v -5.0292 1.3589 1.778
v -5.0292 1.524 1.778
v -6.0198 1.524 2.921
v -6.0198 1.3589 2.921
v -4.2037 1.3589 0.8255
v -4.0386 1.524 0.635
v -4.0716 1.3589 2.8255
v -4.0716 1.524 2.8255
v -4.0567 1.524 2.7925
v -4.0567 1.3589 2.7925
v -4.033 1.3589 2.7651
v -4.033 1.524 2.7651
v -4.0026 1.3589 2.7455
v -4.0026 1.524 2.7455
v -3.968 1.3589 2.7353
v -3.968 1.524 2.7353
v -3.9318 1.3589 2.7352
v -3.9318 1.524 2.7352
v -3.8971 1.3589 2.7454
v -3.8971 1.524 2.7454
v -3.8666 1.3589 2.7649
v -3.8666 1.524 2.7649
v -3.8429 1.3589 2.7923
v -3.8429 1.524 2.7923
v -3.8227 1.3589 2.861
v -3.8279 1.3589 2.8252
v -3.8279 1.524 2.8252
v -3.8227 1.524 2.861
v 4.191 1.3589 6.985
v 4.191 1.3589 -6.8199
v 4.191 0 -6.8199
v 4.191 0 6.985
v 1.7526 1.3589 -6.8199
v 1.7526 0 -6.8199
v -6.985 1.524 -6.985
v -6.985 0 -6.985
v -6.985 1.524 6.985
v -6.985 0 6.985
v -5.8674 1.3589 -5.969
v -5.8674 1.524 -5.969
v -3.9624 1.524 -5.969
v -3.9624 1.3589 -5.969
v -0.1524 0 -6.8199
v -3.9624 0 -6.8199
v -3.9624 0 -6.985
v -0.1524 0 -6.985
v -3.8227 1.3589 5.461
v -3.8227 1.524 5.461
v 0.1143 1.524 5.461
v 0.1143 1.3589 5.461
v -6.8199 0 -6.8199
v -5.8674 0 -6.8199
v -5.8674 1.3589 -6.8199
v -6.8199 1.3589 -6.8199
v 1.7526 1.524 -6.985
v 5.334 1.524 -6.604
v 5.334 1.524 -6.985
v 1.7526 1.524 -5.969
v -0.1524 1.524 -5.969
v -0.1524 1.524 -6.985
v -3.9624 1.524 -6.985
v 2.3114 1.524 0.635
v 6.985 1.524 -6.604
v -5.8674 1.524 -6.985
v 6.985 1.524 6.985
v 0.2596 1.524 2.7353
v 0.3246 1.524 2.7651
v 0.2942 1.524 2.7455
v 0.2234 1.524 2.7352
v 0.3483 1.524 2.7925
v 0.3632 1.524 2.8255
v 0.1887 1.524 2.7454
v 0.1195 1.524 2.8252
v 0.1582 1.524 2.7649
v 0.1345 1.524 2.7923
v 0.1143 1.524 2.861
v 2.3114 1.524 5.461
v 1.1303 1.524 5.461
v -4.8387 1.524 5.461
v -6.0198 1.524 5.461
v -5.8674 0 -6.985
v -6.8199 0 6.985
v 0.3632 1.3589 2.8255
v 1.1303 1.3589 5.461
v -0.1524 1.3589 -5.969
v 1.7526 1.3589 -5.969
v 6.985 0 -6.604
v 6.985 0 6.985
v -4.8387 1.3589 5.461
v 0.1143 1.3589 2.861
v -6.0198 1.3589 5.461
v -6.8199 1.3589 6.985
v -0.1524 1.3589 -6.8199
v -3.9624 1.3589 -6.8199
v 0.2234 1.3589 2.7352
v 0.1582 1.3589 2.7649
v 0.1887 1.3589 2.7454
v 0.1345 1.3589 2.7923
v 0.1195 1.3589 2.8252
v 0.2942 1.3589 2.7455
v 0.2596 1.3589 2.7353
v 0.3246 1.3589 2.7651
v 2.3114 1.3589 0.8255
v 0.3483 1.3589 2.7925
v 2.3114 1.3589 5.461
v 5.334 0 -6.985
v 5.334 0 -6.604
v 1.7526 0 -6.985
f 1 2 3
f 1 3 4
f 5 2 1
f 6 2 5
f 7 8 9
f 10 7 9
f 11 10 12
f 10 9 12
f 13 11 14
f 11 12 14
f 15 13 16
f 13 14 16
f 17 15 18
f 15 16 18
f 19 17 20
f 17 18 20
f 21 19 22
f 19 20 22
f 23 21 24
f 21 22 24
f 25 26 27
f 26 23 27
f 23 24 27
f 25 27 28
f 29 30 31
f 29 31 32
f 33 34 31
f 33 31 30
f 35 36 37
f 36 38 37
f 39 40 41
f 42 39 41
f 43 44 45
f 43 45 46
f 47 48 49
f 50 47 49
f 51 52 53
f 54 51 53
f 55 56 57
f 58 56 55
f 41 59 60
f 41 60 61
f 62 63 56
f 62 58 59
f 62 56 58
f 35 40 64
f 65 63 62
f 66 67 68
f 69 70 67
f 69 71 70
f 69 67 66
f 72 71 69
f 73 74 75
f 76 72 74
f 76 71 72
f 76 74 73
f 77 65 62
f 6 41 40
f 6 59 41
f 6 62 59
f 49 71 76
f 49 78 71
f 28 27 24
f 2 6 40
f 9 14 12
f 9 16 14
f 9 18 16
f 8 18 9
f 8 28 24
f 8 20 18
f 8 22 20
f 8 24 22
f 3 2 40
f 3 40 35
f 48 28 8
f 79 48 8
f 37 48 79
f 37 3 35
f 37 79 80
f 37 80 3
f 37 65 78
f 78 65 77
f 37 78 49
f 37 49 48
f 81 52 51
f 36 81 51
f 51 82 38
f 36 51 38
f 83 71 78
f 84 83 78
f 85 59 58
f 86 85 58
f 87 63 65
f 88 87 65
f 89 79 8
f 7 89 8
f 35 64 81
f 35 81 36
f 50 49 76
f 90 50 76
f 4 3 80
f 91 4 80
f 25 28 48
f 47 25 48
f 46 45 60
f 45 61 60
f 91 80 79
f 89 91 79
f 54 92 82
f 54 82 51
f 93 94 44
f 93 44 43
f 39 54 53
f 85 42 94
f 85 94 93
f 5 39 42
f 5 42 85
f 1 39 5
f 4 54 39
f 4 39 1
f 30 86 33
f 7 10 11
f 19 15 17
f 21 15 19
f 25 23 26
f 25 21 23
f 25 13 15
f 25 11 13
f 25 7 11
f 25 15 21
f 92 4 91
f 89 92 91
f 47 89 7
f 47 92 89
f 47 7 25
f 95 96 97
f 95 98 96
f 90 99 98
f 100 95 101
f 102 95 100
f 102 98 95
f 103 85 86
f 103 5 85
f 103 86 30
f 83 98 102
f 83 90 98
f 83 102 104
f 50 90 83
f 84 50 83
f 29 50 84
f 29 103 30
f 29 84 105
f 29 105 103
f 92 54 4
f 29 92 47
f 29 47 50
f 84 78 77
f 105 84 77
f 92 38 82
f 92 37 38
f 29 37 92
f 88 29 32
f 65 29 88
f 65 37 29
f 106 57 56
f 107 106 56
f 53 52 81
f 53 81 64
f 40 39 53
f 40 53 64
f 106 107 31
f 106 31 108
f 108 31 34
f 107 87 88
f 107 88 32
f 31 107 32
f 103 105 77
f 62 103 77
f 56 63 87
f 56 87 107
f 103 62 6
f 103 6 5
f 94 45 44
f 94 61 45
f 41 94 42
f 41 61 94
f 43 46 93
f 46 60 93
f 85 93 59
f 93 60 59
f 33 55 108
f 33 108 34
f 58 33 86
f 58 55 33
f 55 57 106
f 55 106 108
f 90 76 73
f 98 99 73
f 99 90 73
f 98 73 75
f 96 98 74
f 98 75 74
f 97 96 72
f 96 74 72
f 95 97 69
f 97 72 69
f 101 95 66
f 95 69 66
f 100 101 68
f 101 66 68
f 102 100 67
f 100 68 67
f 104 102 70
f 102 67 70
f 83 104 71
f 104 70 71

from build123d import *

# Parameters (mm, degrees)
SKETCH1_W           = 5.2324
SKETCH1_H           = 13.97
BOSS_EXTRUDE1_DEPTH = 1.524
BOSS_EXTRUDE2_DEPTH = 12.954
SKETCH3_W           = 1.1176
SKETCH3_H           = 1.524
BOSS_EXTRUDE3_DEPTH = 1.016
SKETCH4_W           = 3.81
SKETCH4_H           = 0.1651
BOSS_EXTRUDE4_DEPTH = 1.016
SKETCH5_W           = 3.81
SKETCH5_H           = 0.1651
BOSS_EXTRUDE5_DEPTH = 1.3589
SKETCH6_W           = 13.8049
SKETCH6_H           = 1.3589
CUT_EXTRUDE1_DEPTH  = 0.9525
SKETCH7_W           = 13.8049
SKETCH7_H           = 1.3589
CUT_EXTRUDE2_DEPTH  = 2.4384
SKETCH8_W           = 1.651
SKETCH8_H           = 0.381
CUT_EXTRUDE3_DEPTH  = 1.524
CUT_EXTRUDE4_DEPTH  = 10.995150124
CHAMFER1_SIZE       = 1.143
CHAMFER1_SIZE2      = 0.9906
CHAMFER2_SIZE       = 1.143
CHAMFER2_SIZE_2     = 0.9906


with BuildPart() as part:
    # Sketch1 → Boss-Extrude1 (new body)
    with BuildSketch(Plane(origin=(0, 1.524, 0), x_dir=(-1, 0, 0), z_dir=(0, 1, 0))):
        with Locations((-4.3688, 0)):
            Rectangle(SKETCH1_W, SKETCH1_H)
    extrude(amount=-BOSS_EXTRUDE1_DEPTH)

    # Sketch2 → Boss-Extrude2 (add)
    with BuildSketch(Plane.XY.offset(6.985)):
        Polygon((-5.8674, 1.3589), (1.7526, 1.3589), (1.7526, 1.524), (-6.985, 1.524), (-6.985, 0), (-5.8674, 0), align=None)
    extrude(amount=-BOSS_EXTRUDE2_DEPTH)

    # Sketch3 → Boss-Extrude3 (add)
    with BuildSketch(Plane(origin=(0, 0, -5.969), x_dir=(-1, 0, 0), z_dir=(0, 0, -1))):
        with Locations((6.4262, 0.762)):
            Rectangle(SKETCH3_W, SKETCH3_H)
    extrude(amount=BOSS_EXTRUDE3_DEPTH)

    # Sketch4 → Boss-Extrude4 (add)
    with BuildSketch(Plane(origin=(0, 0, -5.969), x_dir=(-1, 0, 0), z_dir=(0, 0, -1))):
        with Locations((2.0574, 1.44145)):
            Rectangle(SKETCH4_W, SKETCH4_H)
    extrude(amount=BOSS_EXTRUDE4_DEPTH)

    # Sketch5 → Boss-Extrude5 (add)
    with BuildSketch(Plane.XZ.offset(-1.3589)):
        with Locations((-2.0574, -6.90245)):
            Rectangle(SKETCH5_W, SKETCH5_H)
    extrude(amount=BOSS_EXTRUDE5_DEPTH)

    # Sketch6 → Cut-Extrude1 (cut)
    with BuildSketch(Plane(origin=(-5.8674, 0, 0), x_dir=(0, 0, -1), z_dir=(1, 0, 0))):
        with Locations((-0.08255, 0.67945)):
            Rectangle(SKETCH6_W, SKETCH6_H)
    extrude(amount=-CUT_EXTRUDE1_DEPTH, mode=Mode.SUBTRACT)

    # Sketch7 → Cut-Extrude2 (cut)
    with BuildSketch(Plane.ZY.offset(-1.7526)):
        with Locations((0.08255, 0.67945)):
            Rectangle(SKETCH7_W, SKETCH7_H)
    extrude(amount=-CUT_EXTRUDE2_DEPTH, mode=Mode.SUBTRACT)

    # Sketch8 → Cut-Extrude3 (cut)
    with BuildSketch(Plane(origin=(0, 1.524, 0), x_dir=(-1, 0, 0), z_dir=(0, 1, 0))):
        with Locations((-6.1595, -6.7945)):
            Rectangle(SKETCH8_W, SKETCH8_H)
    extrude(amount=-CUT_EXTRUDE3_DEPTH, mode=Mode.SUBTRACT)

    # Sketch9 → Cut-Extrude4 (cut, through all)
    with BuildSketch(Plane(origin=(0, 1.524, 0), x_dir=(-1, 0, 0), z_dir=(0, 1, 0))):
        with BuildLine():
            Line((3.8227, 2.860968655), (3.8227, 5.461))
            Line((3.8227, 5.461), (-0.1143, 5.461))
            Line((-0.1143, 5.461), (-0.1143, 2.860968655))
            ThreePointArc((-0.1143, 2.860968655), (-0.223375415, 2.735239942), (-0.363240303, 2.825478341))
            Line((-0.363240303, 2.825478341), (-1.1303, 5.461))
            Line((-1.1303, 5.461), (-2.3114, 5.461))
            Line((-2.3114, 5.461), (-2.3114, 1.778))
            Line((-2.3114, 1.778), (6.0198, 1.778))
            Line((6.0198, 1.778), (6.0198, 5.461))
            Line((6.0198, 5.461), (4.8387, 5.461))
            Line((4.8387, 5.461), (4.071640303, 2.825478341))
            ThreePointArc((4.071640303, 2.825478341), (3.931775415, 2.735239942), (3.8227, 2.860968655))
        make_face()
    extrude(amount=-CUT_EXTRUDE4_DEPTH, mode=Mode.SUBTRACT)

    # Chamfer1
    chamfer1_edges = [part.edges().sort_by_distance(p)[0] for p in [
        (-6.0198, 1.44145, 1.778),
    ]]
    chamfer1_side = [part.faces().sort_by_distance(p)[0] for p in [
        (-6.0198, 1.44145, 3.6195),
    ]]
    chamfer(chamfer1_edges, length=CHAMFER1_SIZE, length2=CHAMFER1_SIZE2, reference=chamfer1_side[0])

    # Chamfer2
    # the kernel refuses this chamfer: 1.143, 0.9906 mm, written as the material it takes off along each edge
    with BuildSketch(Plane(origin=(2.3114, 1.524, 1.778), x_dir=(0, 0.025420360363461764, -0.9996768504266725), z_dir=(-1, 0, 0))) as chamfer2_piece_1_section:
        Polygon((CHAMFER2_SIZE * 0.999676850427, CHAMFER2_SIZE * 0.0254203603635), (-CHAMFER2_SIZE_2 * 0.0254203603635, CHAMFER2_SIZE_2 * 0.999676850427), (0, 0), align=None)
    chamfer2_piece_1 = extrude(amount=10.285426882, mode=Mode.PRIVATE)
    chamfer2_piece_1 = split(chamfer2_piece_1, bisect_by=Plane(origin=(-3.105218089, 1.443787017, -0.441979128), z_dir=(0.7556890827898172, 0, 0.6549305384178423)), keep=Keep.TOP, mode=Mode.PRIVATE)
    add(chamfer2_piece_1, mode=Mode.SUBTRACT)


solid = part.part
